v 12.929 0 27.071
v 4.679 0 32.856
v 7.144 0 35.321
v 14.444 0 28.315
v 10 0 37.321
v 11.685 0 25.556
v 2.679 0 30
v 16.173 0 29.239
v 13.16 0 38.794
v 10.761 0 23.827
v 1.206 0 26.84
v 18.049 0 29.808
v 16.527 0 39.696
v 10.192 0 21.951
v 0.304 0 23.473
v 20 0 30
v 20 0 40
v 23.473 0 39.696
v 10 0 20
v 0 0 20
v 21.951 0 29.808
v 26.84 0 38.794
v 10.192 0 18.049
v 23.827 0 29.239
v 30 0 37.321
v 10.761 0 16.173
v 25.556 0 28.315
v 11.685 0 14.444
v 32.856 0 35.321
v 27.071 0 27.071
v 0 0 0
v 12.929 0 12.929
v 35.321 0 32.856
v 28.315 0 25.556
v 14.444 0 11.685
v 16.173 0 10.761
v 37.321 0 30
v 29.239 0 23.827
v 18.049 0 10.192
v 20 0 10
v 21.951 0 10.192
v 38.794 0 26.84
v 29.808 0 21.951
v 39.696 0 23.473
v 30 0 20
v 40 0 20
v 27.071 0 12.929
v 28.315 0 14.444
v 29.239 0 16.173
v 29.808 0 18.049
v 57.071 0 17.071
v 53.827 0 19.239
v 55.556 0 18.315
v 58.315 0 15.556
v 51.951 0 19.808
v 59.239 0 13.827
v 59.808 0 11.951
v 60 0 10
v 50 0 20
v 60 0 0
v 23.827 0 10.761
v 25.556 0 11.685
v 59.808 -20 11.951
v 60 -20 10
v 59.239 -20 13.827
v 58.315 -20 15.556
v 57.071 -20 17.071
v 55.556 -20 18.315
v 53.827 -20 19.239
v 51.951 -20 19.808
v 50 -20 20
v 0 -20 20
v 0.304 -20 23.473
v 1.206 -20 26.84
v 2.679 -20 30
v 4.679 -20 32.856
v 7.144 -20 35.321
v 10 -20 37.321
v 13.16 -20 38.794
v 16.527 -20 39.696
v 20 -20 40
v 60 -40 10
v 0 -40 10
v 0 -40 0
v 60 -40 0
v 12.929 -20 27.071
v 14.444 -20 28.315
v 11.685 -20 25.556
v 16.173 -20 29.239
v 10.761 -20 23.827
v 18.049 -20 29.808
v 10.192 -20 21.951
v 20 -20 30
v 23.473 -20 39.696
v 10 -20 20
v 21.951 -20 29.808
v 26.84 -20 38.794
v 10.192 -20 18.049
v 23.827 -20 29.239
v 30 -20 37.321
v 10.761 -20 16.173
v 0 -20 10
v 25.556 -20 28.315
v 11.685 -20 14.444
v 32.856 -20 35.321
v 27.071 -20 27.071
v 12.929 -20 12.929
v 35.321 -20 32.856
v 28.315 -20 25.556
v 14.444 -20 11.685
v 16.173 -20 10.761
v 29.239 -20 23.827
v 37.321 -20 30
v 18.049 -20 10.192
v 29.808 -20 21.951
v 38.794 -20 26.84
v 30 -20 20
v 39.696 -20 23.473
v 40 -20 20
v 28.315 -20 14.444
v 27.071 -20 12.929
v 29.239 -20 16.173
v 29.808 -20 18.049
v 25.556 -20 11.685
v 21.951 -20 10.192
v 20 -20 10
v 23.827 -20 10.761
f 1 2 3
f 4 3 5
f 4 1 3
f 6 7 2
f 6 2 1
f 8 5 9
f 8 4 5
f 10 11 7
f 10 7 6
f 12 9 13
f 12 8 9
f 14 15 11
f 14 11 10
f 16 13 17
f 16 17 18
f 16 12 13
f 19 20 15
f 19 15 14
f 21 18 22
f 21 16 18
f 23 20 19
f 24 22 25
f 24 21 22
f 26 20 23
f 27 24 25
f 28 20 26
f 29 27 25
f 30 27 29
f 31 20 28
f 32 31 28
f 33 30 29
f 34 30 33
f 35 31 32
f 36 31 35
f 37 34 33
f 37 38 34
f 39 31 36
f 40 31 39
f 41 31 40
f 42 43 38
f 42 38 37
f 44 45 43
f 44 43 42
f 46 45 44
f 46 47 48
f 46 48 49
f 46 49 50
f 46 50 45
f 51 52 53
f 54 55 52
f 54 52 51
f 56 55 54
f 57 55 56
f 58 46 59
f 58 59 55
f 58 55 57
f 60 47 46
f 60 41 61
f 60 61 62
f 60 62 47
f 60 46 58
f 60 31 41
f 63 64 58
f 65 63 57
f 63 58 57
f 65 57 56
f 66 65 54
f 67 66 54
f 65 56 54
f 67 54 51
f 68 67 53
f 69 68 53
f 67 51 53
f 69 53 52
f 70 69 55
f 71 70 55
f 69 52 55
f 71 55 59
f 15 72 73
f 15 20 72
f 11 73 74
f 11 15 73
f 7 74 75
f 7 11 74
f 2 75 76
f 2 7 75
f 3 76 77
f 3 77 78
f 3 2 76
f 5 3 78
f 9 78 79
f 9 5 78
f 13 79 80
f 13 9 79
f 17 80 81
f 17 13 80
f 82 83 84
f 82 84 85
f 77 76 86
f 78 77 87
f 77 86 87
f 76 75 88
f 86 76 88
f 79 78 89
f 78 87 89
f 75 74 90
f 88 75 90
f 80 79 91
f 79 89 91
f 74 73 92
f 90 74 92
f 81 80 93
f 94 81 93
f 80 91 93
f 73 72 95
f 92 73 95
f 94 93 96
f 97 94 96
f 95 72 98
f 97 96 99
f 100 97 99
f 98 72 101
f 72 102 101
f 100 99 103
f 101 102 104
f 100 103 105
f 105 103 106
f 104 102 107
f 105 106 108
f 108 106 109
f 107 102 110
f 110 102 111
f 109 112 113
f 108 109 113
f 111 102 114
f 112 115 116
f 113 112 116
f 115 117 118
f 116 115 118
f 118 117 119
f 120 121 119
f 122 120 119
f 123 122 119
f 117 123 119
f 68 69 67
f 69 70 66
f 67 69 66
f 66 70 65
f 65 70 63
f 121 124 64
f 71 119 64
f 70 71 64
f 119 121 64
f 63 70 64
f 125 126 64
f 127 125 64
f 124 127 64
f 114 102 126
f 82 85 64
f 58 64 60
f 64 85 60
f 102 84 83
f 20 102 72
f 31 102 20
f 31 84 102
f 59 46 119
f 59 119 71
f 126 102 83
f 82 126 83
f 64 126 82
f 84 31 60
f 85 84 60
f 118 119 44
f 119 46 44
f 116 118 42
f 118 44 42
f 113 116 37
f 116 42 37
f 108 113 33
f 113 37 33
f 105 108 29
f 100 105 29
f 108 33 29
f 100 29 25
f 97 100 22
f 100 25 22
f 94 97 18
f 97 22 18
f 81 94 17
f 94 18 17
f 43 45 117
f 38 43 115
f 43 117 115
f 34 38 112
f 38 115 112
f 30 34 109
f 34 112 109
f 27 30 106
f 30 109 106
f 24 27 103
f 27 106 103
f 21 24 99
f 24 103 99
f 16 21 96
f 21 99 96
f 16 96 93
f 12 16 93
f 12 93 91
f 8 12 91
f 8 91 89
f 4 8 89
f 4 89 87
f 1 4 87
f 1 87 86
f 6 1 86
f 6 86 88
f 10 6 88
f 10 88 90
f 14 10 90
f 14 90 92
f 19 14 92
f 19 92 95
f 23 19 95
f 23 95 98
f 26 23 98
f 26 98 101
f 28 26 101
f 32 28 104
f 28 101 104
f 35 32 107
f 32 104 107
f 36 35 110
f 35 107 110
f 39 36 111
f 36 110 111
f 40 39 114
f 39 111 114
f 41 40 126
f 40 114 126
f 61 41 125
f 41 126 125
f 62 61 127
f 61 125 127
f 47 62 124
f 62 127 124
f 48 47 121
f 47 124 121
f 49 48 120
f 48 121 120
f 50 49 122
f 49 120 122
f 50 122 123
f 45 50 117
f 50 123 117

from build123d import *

# Parameters (mm, degrees)
F0_W     = 60
F0_H     = 10
F1_DEPTH = 40
F2_W     = 60
F2_H     = 20
F3_DEPTH = 10
F4_W     = 40
F4_H     = 20
F5_DEPTH = 20
F6_R     = 19.99999
F7_R     = 10
F8_R     = 10
F9_DEPTH = 25


# Not quite as in the source:
# - a fillet or chamfer is up to 0.001 mm smaller than in the source, because OpenCascade refuses the exact size


with BuildPart() as f1:
    # F0 (on Front) → F1 (new body)
    with BuildSketch(Plane.XZ):
        with Locations((30, 5)):
            Rectangle(F0_W, F0_H)
    extrude(amount=F1_DEPTH)

    # F2 (on face) → F3 (join)
    with BuildSketch(Plane.XY.offset(10)):
        with Locations((30, -10)):
            Rectangle(F2_W, F2_H)
    extrude(amount=F3_DEPTH)

    # F4 (on face) → F5 (join)
    with BuildSketch(Plane.XY.offset(20)):
        with Locations((20, -10)):
            Rectangle(F4_W, F4_H)
    extrude(amount=F5_DEPTH)

    # F6 (radius 20 in the source; OpenCascade refuses exactly that, so slightly less here)
    f6_edges = [f1.edges().sort_by_distance(p)[0] for p in [
        (0, -10, 40),
        (40, -10, 40),
    ]]
    fillet(f6_edges, radius=F6_R)

    # F7
    f7_edges = [f1.edges().sort_by_distance(p)[0] for p in [
        (60, -10, 20),
    ]]
    fillet(f7_edges, radius=F7_R)

    # F8 (on face) → F9 (cut)
    with BuildSketch(Plane.XZ.offset(20)):
        with Locations((20, 20)):
            Circle(F8_R)
    extrude(amount=-F9_DEPTH, mode=Mode.SUBTRACT)


solid = f1.part
